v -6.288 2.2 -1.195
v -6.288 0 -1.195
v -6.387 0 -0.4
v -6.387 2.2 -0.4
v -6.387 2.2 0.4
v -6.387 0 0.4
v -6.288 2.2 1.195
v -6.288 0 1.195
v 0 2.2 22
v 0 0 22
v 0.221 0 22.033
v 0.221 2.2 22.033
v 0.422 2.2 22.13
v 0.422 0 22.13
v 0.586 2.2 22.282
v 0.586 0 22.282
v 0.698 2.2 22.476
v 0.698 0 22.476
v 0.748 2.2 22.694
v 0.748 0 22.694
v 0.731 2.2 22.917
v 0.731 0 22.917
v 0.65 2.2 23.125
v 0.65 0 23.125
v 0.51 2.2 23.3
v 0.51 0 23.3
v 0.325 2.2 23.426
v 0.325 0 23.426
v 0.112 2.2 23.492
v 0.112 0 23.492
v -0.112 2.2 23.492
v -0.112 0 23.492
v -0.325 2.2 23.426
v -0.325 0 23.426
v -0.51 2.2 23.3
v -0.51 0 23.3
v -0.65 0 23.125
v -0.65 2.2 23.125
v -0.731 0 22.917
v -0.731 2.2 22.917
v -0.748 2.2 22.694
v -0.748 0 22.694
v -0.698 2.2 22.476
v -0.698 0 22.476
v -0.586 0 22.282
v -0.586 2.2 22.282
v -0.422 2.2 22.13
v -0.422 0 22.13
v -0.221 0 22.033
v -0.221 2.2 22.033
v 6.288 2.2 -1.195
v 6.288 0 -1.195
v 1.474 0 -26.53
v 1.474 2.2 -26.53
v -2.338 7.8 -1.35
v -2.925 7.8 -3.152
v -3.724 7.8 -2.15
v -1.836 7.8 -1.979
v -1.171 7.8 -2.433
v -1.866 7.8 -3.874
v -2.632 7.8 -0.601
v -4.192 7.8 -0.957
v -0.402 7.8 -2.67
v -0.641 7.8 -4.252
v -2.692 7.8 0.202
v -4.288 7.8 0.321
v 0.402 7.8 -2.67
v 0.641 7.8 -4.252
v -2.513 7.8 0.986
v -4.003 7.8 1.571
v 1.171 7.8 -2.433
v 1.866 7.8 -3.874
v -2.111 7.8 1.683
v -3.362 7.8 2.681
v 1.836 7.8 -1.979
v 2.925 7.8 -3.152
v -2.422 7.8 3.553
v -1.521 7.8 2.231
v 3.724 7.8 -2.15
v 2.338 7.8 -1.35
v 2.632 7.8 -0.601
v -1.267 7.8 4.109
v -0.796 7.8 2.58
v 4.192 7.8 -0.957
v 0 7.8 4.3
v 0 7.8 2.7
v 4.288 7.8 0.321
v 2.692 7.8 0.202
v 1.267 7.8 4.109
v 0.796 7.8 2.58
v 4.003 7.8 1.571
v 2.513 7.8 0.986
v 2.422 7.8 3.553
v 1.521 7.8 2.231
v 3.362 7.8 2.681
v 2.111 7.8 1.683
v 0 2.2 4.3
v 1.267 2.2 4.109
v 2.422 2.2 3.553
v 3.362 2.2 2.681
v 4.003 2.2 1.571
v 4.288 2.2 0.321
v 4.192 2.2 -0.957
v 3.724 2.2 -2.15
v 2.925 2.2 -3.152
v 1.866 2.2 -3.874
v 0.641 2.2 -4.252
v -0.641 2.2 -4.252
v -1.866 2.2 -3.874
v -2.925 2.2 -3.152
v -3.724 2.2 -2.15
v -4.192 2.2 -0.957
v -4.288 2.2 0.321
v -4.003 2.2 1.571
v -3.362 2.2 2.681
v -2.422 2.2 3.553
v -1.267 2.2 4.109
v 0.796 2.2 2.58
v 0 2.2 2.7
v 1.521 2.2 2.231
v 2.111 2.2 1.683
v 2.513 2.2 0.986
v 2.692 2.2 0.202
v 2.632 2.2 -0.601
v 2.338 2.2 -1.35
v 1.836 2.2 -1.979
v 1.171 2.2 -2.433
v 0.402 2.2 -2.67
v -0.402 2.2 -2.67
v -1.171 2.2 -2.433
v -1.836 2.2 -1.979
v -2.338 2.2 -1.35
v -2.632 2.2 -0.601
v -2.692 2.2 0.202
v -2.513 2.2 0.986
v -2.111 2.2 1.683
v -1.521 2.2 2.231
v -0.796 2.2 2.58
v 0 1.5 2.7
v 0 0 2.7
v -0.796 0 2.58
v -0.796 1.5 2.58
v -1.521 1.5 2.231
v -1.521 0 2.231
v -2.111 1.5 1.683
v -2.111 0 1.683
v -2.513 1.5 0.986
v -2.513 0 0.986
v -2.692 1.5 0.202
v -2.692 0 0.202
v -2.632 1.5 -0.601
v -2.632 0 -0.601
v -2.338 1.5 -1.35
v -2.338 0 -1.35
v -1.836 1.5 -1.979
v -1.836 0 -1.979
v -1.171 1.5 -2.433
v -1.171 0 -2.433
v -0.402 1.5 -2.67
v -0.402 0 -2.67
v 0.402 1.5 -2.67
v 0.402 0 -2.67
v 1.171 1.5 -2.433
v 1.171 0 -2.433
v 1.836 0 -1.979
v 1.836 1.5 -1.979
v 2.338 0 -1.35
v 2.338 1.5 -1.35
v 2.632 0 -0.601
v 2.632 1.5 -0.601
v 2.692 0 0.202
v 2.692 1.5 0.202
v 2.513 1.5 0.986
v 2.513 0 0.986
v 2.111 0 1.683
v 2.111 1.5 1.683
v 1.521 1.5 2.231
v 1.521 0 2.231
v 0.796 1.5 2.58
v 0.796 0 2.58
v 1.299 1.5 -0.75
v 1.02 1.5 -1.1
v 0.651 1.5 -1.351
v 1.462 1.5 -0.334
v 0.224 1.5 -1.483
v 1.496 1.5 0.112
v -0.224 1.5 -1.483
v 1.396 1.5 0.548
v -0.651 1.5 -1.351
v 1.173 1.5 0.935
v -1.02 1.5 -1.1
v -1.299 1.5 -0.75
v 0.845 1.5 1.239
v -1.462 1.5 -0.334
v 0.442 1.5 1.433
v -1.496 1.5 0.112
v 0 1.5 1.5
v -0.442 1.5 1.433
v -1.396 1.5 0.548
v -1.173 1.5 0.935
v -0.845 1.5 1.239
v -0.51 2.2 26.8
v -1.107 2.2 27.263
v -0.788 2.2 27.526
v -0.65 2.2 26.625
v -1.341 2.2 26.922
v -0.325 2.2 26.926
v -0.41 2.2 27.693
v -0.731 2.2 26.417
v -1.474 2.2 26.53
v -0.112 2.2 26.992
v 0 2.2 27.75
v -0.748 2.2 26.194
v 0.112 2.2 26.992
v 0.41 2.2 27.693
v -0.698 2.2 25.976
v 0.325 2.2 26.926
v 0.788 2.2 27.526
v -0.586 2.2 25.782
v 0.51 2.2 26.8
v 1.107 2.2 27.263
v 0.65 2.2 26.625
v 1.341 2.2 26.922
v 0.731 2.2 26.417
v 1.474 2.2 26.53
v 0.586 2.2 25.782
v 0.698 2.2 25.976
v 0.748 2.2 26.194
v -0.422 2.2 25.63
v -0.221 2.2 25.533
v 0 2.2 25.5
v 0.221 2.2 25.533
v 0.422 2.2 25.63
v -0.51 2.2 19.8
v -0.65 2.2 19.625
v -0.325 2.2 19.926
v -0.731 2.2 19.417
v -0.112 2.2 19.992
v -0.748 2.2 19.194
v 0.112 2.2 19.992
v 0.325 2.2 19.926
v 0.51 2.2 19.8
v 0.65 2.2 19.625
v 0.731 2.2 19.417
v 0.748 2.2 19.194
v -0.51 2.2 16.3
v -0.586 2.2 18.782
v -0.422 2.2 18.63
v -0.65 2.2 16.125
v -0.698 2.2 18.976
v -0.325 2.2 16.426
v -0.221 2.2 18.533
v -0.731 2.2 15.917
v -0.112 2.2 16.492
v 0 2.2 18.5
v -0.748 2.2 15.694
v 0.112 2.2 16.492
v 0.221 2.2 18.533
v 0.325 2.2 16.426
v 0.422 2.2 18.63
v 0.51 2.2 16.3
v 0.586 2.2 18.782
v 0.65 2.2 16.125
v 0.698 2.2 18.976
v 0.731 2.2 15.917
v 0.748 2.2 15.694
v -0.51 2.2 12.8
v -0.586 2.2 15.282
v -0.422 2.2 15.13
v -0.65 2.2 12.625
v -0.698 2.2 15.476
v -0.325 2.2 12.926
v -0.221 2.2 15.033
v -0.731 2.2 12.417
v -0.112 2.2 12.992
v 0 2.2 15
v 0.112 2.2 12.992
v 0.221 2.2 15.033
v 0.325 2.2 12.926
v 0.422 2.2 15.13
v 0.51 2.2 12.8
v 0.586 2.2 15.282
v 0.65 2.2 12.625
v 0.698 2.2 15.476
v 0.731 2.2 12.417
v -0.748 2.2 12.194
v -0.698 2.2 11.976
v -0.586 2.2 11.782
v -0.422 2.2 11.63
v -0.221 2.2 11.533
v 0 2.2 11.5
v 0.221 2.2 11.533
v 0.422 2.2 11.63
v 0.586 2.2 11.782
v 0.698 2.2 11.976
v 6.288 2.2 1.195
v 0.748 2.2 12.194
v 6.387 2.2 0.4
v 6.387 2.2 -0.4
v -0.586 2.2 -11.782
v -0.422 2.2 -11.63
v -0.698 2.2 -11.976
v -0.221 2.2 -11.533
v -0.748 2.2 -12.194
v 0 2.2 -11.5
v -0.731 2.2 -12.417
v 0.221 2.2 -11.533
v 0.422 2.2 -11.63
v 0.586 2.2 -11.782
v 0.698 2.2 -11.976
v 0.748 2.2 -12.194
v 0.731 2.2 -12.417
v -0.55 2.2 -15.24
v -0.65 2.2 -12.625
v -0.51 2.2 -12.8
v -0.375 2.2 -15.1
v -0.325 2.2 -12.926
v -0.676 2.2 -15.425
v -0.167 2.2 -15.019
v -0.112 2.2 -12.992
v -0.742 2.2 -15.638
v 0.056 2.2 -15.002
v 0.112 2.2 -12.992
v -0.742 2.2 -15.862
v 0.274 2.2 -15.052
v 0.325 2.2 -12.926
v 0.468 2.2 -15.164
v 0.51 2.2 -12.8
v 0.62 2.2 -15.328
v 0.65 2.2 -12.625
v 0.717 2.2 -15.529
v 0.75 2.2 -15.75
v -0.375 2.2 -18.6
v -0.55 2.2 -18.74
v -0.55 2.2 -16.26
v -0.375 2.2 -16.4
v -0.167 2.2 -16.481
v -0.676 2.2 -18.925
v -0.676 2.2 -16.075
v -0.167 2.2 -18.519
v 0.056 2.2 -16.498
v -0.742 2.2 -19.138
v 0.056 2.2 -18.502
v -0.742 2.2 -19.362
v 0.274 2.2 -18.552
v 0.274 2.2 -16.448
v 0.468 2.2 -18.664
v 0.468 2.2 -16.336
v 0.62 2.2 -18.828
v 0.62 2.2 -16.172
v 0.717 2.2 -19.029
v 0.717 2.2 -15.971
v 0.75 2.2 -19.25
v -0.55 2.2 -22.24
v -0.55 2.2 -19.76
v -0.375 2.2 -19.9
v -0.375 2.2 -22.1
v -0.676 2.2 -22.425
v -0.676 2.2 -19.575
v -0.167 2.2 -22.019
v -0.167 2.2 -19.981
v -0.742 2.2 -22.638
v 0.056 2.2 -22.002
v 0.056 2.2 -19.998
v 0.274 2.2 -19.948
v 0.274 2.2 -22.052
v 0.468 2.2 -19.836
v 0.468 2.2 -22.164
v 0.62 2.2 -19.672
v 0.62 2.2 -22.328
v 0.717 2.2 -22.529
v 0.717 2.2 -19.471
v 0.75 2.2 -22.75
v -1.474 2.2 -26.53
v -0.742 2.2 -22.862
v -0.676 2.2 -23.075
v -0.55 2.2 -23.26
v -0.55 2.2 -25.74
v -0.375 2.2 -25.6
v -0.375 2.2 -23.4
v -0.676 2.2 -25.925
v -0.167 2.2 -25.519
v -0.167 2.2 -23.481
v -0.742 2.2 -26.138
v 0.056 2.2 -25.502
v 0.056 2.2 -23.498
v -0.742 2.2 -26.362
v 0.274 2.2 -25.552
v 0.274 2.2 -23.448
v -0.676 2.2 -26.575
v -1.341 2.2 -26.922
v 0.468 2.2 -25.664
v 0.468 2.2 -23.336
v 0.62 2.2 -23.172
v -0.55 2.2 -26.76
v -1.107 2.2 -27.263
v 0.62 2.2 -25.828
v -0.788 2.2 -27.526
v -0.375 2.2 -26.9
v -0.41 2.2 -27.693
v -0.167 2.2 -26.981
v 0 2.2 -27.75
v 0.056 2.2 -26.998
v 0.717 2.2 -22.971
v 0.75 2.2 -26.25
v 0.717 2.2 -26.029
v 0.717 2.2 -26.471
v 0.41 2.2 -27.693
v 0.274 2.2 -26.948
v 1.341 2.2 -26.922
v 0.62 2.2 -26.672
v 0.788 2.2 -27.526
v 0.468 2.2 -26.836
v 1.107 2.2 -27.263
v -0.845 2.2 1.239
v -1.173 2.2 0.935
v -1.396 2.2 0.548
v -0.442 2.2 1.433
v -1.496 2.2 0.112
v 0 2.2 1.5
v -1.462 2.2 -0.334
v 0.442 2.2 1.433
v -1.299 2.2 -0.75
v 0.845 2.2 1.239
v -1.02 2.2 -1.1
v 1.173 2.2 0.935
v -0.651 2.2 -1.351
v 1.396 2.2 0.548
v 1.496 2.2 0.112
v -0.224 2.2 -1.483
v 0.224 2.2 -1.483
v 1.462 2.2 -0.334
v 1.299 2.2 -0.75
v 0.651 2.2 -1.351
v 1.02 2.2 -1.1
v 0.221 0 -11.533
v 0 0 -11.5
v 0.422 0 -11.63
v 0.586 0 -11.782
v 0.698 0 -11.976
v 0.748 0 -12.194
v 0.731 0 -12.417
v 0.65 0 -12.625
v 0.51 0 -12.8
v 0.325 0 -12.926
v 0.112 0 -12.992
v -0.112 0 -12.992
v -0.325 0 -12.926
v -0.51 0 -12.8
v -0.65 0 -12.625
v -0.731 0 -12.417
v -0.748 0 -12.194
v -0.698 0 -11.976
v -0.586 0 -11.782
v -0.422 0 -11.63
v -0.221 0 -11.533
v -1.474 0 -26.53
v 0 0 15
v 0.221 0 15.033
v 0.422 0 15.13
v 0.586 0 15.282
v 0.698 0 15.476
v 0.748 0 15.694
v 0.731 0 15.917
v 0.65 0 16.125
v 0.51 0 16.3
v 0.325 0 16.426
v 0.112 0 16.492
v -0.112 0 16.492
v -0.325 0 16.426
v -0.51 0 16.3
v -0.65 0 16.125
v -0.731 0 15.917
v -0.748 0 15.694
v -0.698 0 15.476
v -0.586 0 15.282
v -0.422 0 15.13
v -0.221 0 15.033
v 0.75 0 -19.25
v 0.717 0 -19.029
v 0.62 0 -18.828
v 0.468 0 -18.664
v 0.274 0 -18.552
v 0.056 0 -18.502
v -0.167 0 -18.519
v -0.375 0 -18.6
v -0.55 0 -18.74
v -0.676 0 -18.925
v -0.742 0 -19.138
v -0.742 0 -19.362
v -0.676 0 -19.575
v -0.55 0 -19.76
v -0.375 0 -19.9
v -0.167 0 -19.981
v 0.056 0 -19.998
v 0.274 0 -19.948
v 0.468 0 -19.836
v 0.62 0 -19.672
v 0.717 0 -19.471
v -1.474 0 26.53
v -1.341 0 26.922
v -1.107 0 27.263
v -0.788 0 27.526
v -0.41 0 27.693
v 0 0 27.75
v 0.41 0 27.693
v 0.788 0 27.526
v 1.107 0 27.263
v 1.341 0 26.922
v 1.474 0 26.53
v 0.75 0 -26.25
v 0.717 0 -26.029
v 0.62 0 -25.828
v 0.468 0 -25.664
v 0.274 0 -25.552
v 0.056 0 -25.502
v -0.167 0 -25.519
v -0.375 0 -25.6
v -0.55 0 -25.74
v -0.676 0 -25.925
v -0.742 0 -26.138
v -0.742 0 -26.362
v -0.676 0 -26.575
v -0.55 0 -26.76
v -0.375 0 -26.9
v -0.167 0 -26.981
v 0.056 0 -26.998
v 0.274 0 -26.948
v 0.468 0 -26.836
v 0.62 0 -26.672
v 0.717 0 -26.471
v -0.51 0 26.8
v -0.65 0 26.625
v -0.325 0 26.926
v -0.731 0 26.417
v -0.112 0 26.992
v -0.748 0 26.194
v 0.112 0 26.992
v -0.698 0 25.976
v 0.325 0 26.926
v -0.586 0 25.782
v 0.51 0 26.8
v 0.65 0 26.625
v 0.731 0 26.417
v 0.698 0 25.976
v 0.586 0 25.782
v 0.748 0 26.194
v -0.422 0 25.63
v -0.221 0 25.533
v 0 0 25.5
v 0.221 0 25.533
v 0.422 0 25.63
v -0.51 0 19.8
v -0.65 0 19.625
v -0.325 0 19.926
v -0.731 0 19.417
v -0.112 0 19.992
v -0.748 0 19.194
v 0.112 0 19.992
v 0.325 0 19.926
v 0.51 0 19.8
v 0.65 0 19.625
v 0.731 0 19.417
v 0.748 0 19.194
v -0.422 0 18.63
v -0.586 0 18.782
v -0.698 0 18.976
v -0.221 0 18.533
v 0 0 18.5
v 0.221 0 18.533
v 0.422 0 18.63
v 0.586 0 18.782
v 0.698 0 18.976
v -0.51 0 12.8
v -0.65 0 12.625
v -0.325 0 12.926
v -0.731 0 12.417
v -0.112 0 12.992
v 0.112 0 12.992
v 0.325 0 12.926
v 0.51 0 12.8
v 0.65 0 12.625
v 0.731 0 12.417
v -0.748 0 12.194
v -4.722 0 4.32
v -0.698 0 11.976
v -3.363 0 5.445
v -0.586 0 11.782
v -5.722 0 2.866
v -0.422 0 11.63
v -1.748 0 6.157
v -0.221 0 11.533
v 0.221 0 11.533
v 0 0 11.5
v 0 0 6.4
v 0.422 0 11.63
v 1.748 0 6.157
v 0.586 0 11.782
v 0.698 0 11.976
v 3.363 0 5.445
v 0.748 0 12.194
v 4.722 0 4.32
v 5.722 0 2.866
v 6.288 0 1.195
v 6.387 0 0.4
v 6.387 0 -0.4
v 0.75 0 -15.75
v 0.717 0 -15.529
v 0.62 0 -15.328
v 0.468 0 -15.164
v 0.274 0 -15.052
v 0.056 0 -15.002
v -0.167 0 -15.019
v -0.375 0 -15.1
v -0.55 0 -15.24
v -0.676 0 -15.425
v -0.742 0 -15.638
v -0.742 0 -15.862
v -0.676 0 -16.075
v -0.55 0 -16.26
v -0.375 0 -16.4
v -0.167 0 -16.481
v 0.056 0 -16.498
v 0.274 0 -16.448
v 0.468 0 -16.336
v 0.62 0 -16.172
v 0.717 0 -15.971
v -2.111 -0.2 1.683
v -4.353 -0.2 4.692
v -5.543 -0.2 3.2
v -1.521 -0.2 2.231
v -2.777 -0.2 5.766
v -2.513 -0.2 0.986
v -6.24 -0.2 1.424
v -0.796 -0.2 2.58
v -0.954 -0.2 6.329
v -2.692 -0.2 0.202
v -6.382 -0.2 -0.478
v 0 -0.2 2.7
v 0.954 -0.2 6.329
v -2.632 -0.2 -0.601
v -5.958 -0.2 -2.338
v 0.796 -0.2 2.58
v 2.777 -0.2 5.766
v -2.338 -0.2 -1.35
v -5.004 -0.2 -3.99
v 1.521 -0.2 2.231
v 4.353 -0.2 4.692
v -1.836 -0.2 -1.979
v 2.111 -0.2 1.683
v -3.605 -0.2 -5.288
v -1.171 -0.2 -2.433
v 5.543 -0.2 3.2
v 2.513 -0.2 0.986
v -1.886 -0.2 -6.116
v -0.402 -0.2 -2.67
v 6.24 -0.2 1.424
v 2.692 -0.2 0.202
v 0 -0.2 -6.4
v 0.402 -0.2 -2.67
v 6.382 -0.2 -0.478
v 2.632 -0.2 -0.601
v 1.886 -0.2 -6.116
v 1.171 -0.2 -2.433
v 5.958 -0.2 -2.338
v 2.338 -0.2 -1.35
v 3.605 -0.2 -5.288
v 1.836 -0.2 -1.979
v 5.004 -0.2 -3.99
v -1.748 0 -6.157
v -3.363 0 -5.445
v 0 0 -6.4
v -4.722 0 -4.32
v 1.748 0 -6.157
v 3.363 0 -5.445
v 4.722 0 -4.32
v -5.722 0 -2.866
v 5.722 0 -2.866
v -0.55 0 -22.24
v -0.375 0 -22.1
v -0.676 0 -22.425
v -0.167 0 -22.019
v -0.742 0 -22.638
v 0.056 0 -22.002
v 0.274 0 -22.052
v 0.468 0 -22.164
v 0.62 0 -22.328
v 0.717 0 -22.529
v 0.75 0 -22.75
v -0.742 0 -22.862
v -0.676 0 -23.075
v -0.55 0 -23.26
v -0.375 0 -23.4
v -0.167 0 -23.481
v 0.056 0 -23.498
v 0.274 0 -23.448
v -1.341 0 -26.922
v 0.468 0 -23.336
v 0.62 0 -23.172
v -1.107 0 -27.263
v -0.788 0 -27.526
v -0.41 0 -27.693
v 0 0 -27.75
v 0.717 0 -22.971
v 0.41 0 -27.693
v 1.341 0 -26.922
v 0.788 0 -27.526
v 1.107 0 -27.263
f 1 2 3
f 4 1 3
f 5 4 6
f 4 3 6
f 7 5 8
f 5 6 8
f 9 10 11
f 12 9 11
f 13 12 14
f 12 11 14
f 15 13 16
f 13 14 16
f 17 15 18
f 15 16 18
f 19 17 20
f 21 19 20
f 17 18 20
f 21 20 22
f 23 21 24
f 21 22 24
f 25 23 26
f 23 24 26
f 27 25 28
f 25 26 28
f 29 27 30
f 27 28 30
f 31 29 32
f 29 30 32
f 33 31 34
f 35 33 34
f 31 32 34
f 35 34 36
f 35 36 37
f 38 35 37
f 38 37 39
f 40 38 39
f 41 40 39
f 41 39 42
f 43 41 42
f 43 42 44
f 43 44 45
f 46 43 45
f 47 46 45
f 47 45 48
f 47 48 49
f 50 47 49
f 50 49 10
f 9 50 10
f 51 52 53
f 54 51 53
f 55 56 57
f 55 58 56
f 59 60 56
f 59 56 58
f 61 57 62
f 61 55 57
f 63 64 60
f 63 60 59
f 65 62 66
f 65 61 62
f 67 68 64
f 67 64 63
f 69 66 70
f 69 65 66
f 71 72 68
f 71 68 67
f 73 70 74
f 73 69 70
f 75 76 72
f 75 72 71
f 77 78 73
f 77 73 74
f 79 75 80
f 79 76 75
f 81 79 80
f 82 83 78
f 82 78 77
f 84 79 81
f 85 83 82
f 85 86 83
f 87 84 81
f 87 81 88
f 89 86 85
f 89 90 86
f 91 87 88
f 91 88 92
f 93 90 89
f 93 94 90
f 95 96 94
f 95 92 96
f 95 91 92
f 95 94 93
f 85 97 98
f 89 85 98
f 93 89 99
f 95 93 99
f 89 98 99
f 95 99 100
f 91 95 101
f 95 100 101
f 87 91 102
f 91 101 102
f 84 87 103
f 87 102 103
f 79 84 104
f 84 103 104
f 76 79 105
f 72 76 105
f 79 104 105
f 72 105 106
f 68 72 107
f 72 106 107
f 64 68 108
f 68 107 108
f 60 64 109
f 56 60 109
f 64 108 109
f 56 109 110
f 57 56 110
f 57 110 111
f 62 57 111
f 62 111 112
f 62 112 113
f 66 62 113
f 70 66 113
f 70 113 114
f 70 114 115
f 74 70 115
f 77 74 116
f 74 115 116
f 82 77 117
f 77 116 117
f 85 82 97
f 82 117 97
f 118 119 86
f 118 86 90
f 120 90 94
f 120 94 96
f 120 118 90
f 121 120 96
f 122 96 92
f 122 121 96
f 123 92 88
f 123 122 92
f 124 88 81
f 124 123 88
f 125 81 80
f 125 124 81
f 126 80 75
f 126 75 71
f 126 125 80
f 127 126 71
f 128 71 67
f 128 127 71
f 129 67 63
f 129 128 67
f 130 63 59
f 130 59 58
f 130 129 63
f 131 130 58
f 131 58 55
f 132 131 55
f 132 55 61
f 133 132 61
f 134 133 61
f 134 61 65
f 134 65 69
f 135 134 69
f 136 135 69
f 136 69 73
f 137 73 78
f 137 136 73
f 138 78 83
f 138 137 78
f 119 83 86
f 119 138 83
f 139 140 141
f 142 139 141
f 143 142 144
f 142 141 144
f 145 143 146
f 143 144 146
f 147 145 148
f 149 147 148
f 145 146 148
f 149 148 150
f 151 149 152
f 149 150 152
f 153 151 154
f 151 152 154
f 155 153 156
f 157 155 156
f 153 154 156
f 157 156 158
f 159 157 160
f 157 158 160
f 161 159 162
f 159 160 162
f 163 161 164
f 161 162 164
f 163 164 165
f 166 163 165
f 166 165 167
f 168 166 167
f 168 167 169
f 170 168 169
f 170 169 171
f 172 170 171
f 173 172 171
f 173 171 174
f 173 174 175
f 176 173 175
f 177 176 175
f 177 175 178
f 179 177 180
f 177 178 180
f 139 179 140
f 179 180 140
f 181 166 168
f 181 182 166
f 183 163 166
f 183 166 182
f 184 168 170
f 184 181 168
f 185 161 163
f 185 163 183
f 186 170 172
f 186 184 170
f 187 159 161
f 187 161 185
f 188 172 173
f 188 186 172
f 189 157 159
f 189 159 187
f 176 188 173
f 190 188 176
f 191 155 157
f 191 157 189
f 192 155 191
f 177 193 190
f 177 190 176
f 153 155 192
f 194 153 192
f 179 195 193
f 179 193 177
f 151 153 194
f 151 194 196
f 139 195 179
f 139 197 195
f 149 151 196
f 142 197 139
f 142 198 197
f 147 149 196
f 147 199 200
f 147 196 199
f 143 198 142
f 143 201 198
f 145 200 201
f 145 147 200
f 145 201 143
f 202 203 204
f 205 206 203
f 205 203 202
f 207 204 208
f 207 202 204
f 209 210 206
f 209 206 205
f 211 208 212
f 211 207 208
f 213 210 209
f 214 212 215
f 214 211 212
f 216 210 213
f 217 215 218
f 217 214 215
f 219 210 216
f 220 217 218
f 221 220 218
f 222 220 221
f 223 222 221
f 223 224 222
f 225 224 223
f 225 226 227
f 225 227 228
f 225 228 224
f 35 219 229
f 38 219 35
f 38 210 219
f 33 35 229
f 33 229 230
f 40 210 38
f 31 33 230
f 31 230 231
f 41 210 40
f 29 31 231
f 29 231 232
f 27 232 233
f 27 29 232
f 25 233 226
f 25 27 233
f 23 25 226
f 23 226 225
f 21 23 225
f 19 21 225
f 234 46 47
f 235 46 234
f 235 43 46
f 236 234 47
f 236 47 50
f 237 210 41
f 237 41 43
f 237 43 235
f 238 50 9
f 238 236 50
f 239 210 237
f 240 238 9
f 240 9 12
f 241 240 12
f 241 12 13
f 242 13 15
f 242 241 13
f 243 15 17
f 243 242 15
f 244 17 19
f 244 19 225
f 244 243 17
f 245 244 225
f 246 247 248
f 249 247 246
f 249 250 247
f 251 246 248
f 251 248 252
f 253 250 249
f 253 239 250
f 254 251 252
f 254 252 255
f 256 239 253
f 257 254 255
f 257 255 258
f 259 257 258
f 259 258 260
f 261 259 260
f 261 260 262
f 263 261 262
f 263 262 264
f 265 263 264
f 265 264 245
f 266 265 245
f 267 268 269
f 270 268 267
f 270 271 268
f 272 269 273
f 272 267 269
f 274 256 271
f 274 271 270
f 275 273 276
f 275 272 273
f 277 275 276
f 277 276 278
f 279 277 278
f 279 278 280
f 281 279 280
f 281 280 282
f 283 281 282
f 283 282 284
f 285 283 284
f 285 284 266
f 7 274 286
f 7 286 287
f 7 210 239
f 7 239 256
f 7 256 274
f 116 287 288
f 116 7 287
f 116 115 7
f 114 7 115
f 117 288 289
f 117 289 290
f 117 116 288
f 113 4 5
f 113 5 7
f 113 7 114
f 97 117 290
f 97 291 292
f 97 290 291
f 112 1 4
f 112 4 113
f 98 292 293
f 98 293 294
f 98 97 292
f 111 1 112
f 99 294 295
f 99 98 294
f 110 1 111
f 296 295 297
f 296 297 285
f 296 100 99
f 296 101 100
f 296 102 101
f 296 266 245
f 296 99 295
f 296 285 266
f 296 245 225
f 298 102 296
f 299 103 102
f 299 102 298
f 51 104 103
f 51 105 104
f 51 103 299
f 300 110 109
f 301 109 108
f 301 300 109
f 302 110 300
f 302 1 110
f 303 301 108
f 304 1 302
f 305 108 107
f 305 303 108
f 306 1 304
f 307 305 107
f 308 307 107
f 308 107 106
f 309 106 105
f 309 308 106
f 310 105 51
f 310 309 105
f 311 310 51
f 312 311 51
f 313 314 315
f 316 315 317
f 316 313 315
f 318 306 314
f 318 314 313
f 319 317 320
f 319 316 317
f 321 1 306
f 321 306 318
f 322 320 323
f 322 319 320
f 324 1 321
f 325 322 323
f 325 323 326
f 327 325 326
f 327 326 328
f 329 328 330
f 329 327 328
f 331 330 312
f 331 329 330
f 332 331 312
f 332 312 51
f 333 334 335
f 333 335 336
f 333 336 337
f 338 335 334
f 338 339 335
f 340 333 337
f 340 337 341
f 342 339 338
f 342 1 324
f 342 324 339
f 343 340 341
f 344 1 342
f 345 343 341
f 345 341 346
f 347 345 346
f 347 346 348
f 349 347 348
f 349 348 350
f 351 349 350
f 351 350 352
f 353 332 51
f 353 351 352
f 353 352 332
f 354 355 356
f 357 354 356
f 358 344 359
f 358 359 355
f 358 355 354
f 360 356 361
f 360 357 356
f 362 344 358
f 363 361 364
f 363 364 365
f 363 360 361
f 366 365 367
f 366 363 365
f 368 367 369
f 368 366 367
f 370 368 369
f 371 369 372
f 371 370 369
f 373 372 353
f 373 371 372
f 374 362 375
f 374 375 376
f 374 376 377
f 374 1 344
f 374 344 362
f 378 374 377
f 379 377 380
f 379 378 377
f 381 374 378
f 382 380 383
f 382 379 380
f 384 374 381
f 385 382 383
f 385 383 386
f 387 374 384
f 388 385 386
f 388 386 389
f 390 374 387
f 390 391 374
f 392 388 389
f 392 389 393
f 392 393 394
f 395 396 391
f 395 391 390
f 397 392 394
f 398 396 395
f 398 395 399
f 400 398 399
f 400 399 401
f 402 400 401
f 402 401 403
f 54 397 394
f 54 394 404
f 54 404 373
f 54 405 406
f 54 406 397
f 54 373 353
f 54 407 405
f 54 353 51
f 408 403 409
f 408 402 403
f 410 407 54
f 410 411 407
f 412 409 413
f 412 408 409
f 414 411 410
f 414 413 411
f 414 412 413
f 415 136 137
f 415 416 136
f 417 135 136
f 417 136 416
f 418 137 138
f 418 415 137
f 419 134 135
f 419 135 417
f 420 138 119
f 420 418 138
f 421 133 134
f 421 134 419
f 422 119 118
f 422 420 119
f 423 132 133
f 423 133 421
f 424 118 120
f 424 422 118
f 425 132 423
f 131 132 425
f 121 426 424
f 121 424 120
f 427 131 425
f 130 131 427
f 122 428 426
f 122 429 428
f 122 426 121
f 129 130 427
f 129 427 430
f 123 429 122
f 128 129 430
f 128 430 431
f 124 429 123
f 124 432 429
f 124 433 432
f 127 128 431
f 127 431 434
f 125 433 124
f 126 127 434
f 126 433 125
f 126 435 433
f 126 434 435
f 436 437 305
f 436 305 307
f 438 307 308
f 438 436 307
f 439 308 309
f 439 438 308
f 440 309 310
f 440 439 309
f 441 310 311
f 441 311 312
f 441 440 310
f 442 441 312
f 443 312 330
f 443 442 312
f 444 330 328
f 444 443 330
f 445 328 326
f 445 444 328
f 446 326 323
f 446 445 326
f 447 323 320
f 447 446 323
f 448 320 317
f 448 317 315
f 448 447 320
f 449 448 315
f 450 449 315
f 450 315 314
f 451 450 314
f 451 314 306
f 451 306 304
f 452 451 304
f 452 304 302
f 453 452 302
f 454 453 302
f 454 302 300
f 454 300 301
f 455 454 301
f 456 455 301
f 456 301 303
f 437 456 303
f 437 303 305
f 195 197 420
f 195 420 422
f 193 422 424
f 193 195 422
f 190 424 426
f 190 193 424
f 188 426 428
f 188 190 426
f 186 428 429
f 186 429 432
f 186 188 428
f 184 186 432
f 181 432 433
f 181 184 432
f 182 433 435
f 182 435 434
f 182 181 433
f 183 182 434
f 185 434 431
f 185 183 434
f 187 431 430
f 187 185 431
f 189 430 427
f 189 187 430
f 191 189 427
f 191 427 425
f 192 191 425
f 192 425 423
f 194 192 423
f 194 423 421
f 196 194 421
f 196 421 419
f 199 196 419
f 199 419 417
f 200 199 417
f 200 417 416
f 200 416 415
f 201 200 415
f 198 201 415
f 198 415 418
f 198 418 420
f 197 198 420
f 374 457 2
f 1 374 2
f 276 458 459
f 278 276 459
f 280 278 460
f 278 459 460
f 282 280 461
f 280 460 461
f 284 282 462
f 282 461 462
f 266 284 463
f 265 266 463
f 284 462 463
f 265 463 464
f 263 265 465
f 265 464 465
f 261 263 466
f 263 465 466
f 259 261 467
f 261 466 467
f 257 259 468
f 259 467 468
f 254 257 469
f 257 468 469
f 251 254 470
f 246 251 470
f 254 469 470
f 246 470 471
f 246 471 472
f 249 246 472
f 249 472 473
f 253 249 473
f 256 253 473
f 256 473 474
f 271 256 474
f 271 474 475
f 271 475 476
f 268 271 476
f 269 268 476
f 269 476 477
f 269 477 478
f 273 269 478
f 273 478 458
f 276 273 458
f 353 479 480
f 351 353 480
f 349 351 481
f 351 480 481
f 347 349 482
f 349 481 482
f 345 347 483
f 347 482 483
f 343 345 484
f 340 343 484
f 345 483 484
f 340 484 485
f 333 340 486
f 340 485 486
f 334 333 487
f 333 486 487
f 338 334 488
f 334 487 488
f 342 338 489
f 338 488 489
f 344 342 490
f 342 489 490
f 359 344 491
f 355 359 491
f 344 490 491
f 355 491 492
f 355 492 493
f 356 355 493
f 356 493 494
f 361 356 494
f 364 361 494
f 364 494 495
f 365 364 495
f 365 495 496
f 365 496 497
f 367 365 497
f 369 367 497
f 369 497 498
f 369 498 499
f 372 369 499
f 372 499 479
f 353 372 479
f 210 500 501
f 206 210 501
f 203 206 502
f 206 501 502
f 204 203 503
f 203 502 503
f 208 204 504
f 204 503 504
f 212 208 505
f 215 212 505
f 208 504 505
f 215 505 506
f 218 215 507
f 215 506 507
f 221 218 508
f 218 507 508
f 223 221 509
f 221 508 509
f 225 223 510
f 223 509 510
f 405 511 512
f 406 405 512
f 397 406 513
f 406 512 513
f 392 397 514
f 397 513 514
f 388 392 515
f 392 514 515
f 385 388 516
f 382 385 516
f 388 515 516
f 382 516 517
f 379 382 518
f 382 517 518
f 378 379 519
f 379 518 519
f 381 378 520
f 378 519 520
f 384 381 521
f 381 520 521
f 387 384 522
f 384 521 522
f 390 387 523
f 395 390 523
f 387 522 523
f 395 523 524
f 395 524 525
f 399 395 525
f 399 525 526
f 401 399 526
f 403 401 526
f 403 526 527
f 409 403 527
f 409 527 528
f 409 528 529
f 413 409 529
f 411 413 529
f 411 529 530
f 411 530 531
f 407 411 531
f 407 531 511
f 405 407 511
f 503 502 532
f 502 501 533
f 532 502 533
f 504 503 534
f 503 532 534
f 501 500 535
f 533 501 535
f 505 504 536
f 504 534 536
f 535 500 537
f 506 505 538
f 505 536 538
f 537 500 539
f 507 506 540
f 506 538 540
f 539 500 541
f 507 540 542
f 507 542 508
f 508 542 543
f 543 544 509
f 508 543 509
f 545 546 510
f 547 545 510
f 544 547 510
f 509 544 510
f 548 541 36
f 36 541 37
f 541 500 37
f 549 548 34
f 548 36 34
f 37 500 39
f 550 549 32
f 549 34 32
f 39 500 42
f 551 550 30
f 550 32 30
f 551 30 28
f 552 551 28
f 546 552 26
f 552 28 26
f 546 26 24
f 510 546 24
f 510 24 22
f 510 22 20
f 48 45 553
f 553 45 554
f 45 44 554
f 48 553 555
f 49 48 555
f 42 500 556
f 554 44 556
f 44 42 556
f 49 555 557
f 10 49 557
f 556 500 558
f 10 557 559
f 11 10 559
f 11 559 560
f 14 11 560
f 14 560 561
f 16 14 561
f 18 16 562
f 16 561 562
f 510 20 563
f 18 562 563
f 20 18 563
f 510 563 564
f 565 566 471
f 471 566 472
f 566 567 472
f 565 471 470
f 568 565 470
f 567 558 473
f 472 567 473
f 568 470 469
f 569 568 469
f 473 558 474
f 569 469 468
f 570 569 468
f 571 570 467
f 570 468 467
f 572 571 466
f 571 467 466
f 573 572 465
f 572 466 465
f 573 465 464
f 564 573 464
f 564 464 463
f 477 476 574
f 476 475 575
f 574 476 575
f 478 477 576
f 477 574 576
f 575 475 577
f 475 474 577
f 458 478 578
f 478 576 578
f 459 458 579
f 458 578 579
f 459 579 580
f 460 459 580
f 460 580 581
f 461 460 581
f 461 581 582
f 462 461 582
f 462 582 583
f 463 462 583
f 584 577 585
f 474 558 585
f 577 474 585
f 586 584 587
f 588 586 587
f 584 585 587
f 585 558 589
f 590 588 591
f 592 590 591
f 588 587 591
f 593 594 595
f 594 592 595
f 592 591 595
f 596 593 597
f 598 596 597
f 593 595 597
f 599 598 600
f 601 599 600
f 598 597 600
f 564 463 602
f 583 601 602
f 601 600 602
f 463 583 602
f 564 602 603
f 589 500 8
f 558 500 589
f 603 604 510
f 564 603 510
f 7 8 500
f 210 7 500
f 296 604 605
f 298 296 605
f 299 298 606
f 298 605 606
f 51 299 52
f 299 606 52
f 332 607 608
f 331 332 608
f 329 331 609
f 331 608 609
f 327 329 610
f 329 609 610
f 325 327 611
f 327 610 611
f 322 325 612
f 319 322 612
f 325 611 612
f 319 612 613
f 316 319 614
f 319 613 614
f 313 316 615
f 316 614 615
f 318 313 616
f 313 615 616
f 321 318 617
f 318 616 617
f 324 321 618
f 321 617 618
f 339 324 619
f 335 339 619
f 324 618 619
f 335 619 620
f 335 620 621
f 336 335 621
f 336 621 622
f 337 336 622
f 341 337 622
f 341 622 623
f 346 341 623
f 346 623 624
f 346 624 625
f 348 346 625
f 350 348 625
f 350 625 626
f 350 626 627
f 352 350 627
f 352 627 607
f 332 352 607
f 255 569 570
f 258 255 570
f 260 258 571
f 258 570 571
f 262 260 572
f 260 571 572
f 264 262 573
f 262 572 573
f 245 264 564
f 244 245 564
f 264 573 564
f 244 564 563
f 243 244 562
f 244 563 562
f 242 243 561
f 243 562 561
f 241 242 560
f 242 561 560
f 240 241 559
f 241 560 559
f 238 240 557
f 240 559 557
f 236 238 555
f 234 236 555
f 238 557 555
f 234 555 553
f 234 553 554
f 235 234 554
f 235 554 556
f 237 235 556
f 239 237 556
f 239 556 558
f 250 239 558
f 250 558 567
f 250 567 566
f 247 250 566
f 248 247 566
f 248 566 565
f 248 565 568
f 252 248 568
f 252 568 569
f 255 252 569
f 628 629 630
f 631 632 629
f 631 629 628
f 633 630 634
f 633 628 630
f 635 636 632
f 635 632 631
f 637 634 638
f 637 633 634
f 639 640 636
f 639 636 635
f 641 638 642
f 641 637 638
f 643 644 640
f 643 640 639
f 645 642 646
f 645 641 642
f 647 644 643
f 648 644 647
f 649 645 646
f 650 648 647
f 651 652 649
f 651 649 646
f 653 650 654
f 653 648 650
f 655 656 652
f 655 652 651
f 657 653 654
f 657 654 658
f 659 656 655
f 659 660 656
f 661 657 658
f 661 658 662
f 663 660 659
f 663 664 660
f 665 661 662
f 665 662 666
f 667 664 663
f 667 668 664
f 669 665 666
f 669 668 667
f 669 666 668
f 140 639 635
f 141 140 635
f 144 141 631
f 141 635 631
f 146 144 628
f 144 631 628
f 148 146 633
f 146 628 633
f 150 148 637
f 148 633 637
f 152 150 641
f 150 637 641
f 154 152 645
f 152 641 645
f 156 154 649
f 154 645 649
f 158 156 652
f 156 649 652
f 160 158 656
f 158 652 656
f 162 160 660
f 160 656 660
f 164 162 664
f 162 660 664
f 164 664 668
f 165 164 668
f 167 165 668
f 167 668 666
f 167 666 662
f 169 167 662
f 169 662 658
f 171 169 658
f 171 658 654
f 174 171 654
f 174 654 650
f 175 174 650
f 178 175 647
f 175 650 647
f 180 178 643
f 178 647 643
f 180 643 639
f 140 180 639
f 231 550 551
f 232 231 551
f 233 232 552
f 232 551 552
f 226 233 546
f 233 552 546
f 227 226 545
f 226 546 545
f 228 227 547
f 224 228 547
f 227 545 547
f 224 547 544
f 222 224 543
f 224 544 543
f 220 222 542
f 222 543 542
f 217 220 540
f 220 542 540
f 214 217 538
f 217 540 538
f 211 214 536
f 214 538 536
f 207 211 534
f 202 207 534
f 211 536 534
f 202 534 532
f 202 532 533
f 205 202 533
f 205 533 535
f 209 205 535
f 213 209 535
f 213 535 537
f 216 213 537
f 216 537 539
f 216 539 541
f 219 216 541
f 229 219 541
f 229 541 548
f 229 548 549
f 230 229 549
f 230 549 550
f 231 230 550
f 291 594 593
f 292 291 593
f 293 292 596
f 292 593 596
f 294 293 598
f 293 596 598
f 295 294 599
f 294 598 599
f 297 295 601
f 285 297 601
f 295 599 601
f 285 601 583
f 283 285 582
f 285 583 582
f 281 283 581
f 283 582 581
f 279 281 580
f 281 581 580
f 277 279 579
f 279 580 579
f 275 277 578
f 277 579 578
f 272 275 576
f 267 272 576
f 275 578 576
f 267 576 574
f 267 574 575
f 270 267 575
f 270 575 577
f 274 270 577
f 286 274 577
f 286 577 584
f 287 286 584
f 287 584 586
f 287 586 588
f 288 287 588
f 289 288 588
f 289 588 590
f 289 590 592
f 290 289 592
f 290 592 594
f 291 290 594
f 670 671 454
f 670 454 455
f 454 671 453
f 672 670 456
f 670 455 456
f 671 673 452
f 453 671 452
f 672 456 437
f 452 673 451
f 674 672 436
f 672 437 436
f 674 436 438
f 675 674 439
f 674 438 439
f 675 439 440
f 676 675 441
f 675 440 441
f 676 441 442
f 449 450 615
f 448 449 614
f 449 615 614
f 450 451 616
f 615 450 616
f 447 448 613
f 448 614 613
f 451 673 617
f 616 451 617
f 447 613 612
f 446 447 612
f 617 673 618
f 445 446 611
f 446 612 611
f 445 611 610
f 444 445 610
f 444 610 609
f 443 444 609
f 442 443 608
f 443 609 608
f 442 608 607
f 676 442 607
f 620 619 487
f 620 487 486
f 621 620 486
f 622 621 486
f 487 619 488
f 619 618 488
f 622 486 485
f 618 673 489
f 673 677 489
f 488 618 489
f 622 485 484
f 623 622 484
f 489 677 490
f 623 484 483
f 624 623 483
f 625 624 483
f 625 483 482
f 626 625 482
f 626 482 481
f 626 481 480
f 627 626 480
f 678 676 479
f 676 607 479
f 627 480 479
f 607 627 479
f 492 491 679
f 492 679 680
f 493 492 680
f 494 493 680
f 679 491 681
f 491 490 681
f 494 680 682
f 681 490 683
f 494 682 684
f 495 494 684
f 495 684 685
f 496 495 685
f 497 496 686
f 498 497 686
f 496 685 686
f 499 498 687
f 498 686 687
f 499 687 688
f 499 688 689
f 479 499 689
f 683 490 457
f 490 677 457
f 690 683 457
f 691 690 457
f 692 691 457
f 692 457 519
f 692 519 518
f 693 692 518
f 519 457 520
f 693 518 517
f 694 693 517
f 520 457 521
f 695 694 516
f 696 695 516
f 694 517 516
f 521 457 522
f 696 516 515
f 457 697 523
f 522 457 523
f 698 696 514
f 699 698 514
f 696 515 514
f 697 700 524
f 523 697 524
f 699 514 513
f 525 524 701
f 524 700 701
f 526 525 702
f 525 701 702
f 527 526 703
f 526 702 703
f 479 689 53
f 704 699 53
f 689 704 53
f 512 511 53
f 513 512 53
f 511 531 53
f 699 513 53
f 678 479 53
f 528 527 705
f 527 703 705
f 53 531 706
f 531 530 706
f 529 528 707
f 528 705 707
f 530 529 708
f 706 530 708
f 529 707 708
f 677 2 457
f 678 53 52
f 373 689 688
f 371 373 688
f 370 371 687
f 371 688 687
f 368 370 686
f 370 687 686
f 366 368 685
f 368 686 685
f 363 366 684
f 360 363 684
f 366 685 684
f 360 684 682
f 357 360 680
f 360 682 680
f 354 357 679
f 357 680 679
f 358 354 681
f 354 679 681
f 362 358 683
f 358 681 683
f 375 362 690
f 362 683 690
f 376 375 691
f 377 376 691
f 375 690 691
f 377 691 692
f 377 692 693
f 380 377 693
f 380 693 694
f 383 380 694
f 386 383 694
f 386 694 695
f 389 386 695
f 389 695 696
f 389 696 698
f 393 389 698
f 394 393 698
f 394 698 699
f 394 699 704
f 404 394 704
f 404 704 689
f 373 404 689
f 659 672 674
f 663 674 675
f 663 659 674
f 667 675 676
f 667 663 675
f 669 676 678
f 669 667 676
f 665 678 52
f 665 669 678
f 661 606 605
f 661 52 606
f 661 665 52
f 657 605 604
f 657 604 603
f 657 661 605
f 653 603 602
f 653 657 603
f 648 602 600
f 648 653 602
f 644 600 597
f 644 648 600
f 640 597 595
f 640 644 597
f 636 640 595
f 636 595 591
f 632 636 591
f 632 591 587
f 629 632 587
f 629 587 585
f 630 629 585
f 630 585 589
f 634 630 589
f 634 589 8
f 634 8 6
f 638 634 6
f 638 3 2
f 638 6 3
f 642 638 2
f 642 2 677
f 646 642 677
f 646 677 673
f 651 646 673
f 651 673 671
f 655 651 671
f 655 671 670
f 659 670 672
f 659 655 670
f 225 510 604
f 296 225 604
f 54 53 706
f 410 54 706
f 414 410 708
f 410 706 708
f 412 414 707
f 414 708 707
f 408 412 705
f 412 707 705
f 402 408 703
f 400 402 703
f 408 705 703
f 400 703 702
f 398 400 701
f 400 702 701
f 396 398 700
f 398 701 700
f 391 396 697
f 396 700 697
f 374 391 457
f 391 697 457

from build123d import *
from build123d.topology import SkipClean

# Parameters (mm, degrees)
SKETCH1_R               = 1.5
BOSS_EXTRUDE1_DEPTH     = 2.2
SKETCH3_R               = 4.3
SKETCH3_R_2             = 2.7
BOSS_EXTRUDE2_DEPTH     = 5.6
BOSS_EXTRUDE3_START     = 0.2
SKETCH4_R               = 6.4
SKETCH4_R_2             = 2.7
BOSS_EXTRUDE3_DEPTH     = 0.2
SKETCH7_R               = 2.7
CUT_EXTRUDE1_DEPTH      = 1.5
CUT_EXTRUDE2_REACH      = 31.527
SKETCH8_R               = 0.75
LPATTERN1_COUNT         = 5
LPATTERN1_PITCH         = 3.5
MIRROR1_COPY_1_REACH    = 31.527
MIRROR1_COPY_1_SKETCH_R = 0.75
MIRROR1_COPY_2_REACH    = 31.527
MIRROR1_COPY_2_SKETCH_R = 0.75
MIRROR1_COPY_3_REACH    = 31.527
MIRROR1_COPY_3_SKETCH_R = 0.75
MIRROR1_COPY_4_REACH    = 31.527
MIRROR1_COPY_4_SKETCH_R = 0.75


with BuildPart() as part:
    # Sketch1 → Boss-Extrude1 (new body)
    with BuildSketch(Plane(origin=(0, 0, 0), x_dir=(1, 0, 0), z_dir=(0, 1, 0))):
        with BuildLine():
            Line((-1.473634962, 26.53), (-6.287509169, 1.194666667))
            ThreePointArc((-6.287509169, 1.194666667), (-6.4, 0), (-6.287509169, -1.194666667))
            Line((-6.287509169, -1.194666667), (-1.473634962, -26.53))
            ThreePointArc((-1.473634962, -26.53), (0, -27.75), (1.473634962, -26.53))
            Line((1.473634962, -26.53), (6.287509169, -1.194666667))
            ThreePointArc((6.287509169, -1.194666667), (6.4, 0), (6.287509169, 1.194666667))
            Line((6.287509169, 1.194666667), (1.473634962, 26.53))
            ThreePointArc((1.473634962, 26.53), (0, 27.75), (-1.473634962, 26.53))
        make_face()
        with Locations(Location((0, 0, 0), (0, 0, 270))):
            Circle(SKETCH1_R, mode=Mode.SUBTRACT)
    extrude(amount=BOSS_EXTRUDE1_DEPTH)

    # Sketch3 → Boss-Extrude2 (add)
    with BuildSketch(Plane(origin=(0, 2.2, 0), x_dir=(1, 0, 0), z_dir=(0, 1, 0))):
        with Locations(Location((0, 0, 0), (0, 0, 270))):
            Circle(SKETCH3_R)
        with Locations(Location((0, 0, 0), (0, 0, 270))):
            Circle(SKETCH3_R_2, mode=Mode.SUBTRACT)
    extrude(amount=BOSS_EXTRUDE2_DEPTH)

    # Sketch4 → Boss-Extrude3 (add)
    with SkipClean():  # the faces are left unmerged after this step: merging them gives an invalid solid
        with BuildSketch(Plane.XZ.offset(BOSS_EXTRUDE3_START)):
            with Locations(Location((0, 0, 0), (0, 0, 270))):
                Circle(SKETCH4_R)
            with Locations(Location((0, 0, 0), (0, 0, 90))):
                Circle(SKETCH4_R_2, mode=Mode.SUBTRACT)
        extrude(amount=-BOSS_EXTRUDE3_DEPTH)

    # Sketch7 → Cut-Extrude1 (cut)
    with SkipClean():  # the faces are left unmerged after this step: merging them gives an invalid solid
        with BuildSketch(Plane.XZ):
            with Locations(Location((0, 0, 0), (0, 0, 90))):
                Circle(SKETCH7_R)
        extrude(amount=-CUT_EXTRUDE1_DEPTH, mode=Mode.SUBTRACT)

    # Sketch8 → Cut-Extrude2 (cut, up to next)
    with BuildSketch(Plane.XZ, mode=Mode.PRIVATE) as cut_extrude2_sk1:
        with Locations(Location((0, 12.25, 0), (0, 0, 270))):
            Circle(SKETCH8_R)
    cut_extrude2_tool1 = extrude(cut_extrude2_sk1.sketch, amount=-CUT_EXTRUDE2_REACH, mode=Mode.PRIVATE) & part.part
    cut_extrude2 = cut_extrude2_tool1.solids().sort_by_distance((0, 0, 12.25))[0]
    add(cut_extrude2, mode=Mode.SUBTRACT)

    # LPattern1: Cut-Extrude2 ×5
    with SkipClean():  # the faces are left unmerged after this step: merging them gives an invalid solid
        with Locations(*[(0, 0, i * LPATTERN1_PITCH) for i in range(1, LPATTERN1_COUNT)]):
            add(cut_extrude2, mode=Mode.SUBTRACT)

    # Mirror1: Cut-Extrude2 across plane
    with SkipClean():  # the faces are left unmerged after this step: merging them gives an invalid solid
        add(cut_extrude2.mirror(Plane.XY), mode=Mode.SUBTRACT)

    # Mirror1 copy 1 sketch → Mirror1 copy 1 (cut, up to next)
    with BuildSketch(Plane(origin=(0, 0, -3.5), x_dir=(1, 0, 0), z_dir=(0, -1, 0)), mode=Mode.PRIVATE) as mirror1_copy_1_sk1:
        with Locations((0, -12.25)):
            Circle(MIRROR1_COPY_1_SKETCH_R)
    mirror1_copy_1_tool1 = extrude(mirror1_copy_1_sk1.sketch, amount=-MIRROR1_COPY_1_REACH, mode=Mode.PRIVATE) & part.part
    add(mirror1_copy_1_tool1.solids().sort_by_distance((0, 0, -15.75))[0], mode=Mode.SUBTRACT)

    # Mirror1 copy 2 sketch → Mirror1 copy 2 (cut, up to next)
    with BuildSketch(Plane(origin=(0, 0, -7), x_dir=(1, 0, 0), z_dir=(0, -1, 0)), mode=Mode.PRIVATE) as mirror1_copy_2_sk1:
        with Locations((0, -12.25)):
            Circle(MIRROR1_COPY_2_SKETCH_R)
    mirror1_copy_2_tool1 = extrude(mirror1_copy_2_sk1.sketch, amount=-MIRROR1_COPY_2_REACH, mode=Mode.PRIVATE) & part.part
    add(mirror1_copy_2_tool1.solids().sort_by_distance((0, 0, -19.25))[0], mode=Mode.SUBTRACT)

    # Mirror1 copy 3 sketch → Mirror1 copy 3 (cut, up to next)
    with BuildSketch(Plane(origin=(0, 0, -10.5), x_dir=(1, 0, 0), z_dir=(0, -1, 0)), mode=Mode.PRIVATE) as mirror1_copy_3_sk1:
        with Locations((0, -12.25)):
            Circle(MIRROR1_COPY_3_SKETCH_R)
    mirror1_copy_3_tool1 = extrude(mirror1_copy_3_sk1.sketch, amount=-MIRROR1_COPY_3_REACH, mode=Mode.PRIVATE) & part.part
    add(mirror1_copy_3_tool1.solids().sort_by_distance((0, 0, -22.75))[0], mode=Mode.SUBTRACT)

    # Mirror1 copy 4 sketch → Mirror1 copy 4 (cut, up to next)
    with BuildSketch(Plane(origin=(0, 0, -14), x_dir=(1, 0, 0), z_dir=(0, -1, 0)), mode=Mode.PRIVATE) as mirror1_copy_4_sk1:
        with Locations((0, -12.25)):
            Circle(MIRROR1_COPY_4_SKETCH_R)
    mirror1_copy_4_tool1 = extrude(mirror1_copy_4_sk1.sketch, amount=-MIRROR1_COPY_4_REACH, mode=Mode.PRIVATE) & part.part
    add(mirror1_copy_4_tool1.solids().sort_by_distance((0, 0, -26.25))[0], mode=Mode.SUBTRACT)


solid = part.part
